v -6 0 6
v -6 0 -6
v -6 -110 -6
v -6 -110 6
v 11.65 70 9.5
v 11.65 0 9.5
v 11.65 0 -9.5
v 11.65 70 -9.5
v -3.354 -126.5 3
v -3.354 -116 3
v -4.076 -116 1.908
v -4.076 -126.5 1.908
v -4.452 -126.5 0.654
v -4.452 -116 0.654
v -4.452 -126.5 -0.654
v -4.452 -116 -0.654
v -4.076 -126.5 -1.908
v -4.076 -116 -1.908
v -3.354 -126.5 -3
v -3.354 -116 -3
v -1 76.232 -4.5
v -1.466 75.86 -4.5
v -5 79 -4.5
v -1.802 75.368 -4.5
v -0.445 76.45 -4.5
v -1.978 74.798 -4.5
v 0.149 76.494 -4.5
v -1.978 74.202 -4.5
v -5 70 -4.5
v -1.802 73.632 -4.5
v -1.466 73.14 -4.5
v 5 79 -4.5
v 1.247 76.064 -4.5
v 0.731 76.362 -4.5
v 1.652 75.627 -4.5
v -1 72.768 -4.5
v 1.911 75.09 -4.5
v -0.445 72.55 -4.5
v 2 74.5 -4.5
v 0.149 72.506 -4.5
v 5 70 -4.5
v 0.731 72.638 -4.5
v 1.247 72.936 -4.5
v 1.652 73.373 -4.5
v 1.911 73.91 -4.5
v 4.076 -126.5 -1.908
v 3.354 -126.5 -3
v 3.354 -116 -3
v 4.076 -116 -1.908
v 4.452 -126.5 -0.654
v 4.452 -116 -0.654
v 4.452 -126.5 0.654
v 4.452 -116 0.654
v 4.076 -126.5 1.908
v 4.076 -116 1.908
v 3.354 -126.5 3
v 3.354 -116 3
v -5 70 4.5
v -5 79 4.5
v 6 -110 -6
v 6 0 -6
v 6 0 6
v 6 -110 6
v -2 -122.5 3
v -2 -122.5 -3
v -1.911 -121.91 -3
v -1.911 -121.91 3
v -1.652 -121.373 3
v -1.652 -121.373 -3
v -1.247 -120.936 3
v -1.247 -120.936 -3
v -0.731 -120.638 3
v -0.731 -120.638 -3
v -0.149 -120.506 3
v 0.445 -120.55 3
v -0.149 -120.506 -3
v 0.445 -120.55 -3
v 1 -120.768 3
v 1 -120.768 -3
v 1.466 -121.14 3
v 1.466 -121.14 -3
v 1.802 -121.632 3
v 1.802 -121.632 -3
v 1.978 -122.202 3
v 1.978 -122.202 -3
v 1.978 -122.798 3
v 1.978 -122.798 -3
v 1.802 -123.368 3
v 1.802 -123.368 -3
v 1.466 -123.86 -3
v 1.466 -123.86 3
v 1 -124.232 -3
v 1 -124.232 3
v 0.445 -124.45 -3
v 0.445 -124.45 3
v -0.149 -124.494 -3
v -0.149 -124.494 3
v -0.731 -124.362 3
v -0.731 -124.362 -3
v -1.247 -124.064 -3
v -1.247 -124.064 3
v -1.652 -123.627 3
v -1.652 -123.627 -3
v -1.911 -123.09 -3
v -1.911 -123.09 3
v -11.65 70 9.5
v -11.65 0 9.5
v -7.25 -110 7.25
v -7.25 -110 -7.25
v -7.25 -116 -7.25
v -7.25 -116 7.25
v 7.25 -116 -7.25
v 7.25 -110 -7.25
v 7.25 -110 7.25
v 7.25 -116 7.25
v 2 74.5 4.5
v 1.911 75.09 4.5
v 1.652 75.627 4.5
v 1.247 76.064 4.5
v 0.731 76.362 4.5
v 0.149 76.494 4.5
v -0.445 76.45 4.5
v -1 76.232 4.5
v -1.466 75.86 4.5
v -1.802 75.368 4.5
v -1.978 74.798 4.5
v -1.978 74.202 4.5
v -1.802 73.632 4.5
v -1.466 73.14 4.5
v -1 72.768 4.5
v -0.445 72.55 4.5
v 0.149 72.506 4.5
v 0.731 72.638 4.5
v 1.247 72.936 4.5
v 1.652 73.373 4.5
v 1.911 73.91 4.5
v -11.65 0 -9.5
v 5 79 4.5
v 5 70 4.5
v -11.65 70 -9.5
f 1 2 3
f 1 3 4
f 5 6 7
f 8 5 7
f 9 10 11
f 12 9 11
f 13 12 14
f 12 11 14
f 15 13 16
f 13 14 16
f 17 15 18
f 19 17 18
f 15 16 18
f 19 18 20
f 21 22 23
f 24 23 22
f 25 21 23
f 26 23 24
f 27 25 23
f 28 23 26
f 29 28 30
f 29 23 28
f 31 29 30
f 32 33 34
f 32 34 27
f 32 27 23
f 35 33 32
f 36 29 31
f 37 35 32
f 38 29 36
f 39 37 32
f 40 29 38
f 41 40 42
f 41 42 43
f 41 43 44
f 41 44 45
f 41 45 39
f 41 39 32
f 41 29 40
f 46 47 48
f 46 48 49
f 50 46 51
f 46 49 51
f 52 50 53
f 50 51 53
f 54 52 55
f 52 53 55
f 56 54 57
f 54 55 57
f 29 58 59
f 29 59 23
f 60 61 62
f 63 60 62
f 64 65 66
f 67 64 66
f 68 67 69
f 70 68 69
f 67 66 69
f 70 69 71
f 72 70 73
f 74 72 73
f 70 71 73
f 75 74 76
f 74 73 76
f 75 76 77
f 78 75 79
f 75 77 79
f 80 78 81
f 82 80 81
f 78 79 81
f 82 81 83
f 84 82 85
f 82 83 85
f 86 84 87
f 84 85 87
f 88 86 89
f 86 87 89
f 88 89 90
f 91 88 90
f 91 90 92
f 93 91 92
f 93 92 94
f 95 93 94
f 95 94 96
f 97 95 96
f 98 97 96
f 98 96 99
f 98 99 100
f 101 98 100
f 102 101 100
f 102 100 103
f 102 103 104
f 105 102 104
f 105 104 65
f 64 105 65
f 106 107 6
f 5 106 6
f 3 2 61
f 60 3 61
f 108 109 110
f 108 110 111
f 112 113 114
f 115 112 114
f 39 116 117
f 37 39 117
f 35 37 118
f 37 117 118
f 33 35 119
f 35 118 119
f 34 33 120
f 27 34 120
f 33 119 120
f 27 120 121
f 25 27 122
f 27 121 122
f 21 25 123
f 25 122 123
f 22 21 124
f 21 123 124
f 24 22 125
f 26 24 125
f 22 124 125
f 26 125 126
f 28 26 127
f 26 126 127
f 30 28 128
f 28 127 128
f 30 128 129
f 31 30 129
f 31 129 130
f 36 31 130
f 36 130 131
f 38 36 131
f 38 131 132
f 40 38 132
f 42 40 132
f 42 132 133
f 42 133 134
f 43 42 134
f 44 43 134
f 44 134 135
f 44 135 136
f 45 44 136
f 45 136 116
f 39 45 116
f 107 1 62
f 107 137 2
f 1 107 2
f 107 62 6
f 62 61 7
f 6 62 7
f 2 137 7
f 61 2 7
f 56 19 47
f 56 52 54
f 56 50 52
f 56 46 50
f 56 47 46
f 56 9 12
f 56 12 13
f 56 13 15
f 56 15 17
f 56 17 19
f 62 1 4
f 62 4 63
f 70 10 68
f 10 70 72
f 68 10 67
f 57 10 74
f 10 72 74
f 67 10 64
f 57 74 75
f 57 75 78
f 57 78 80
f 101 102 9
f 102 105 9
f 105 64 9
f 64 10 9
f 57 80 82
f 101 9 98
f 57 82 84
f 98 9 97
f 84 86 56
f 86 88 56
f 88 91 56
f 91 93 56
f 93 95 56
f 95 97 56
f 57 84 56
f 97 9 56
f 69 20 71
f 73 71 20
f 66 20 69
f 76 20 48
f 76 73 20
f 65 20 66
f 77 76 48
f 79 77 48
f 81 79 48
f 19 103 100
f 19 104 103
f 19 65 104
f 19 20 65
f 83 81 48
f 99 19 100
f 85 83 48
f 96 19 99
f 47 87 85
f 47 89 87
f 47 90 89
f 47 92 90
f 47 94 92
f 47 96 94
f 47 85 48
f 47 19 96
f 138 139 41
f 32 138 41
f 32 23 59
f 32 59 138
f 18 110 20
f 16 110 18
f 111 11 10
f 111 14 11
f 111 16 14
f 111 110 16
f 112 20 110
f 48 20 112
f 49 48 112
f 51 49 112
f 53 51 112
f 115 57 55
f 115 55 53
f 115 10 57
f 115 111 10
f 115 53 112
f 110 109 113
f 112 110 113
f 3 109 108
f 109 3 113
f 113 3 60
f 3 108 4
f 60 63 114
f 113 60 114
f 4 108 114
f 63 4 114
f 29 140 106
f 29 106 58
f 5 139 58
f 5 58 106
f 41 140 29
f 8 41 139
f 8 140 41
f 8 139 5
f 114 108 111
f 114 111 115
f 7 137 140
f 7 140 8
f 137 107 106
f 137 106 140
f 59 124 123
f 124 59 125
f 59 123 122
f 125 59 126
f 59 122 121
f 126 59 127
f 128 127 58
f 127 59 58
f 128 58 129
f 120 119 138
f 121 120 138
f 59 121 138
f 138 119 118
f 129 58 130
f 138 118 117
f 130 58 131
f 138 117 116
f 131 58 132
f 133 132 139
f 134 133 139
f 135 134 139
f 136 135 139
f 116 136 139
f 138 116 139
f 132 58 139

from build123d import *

# Parameters (mm, degrees)
SKETCH_1_W               = 23.3
SKETCH_1_H               = 19
EXTRUDE_1_DEPTH          = 70
SKETCH_2_W               = 10
SKETCH_2_H               = 9
EXTRUDE_2_DEPTH          = 9
SKETCH_3_R               = 2
CUT_EXTRUDE_1_DEPTH      = 6
CUT_EXTRUDE_1_DEPTH_BACK = 15
SKETCH_4_W               = 12
SKETCH_4_H               = 12
EXTRUDE_3_DEPTH          = 110
SKETCH_5_W               = 14.5
SKETCH_5_H               = 14.5
EXTRUDE_4_DEPTH          = 6
SKETCH_6_R               = 4.5
EXTRUDE_5_DEPTH          = 10.5
CUT_EXTRUDE_3_DEPTH      = 10.5
SKETCH_8_R               = 2
CUT_EXTRUDE_4_DEPTH      = 13.5


with BuildPart() as part:
    # 草图1 → 凸台-拉伸1 (new body)
    with BuildSketch(Plane(origin=(0, 0, 0), x_dir=(1, 0, 0), z_dir=(0, 1, 0))):
        Rectangle(SKETCH_1_W, SKETCH_1_H)
    extrude(amount=EXTRUDE_1_DEPTH)

    # 草图2 → 凸台-拉伸2 (add)
    with BuildSketch(Plane(origin=(0, 70, 0), x_dir=(1, 0, 0), z_dir=(0, 1, 0))):
        Rectangle(SKETCH_2_W, SKETCH_2_H)
    extrude(amount=EXTRUDE_2_DEPTH)

    # 草图3 → 切除-拉伸1 (cut, two sides)
    with BuildSketch(Plane.XY.offset(4.5)) as cut_extrude_1_sk:
        with Locations((0, 74.5)):
            Circle(SKETCH_3_R)
    extrude(amount=CUT_EXTRUDE_1_DEPTH, mode=Mode.SUBTRACT)
    extrude(cut_extrude_1_sk.sketch, amount=-CUT_EXTRUDE_1_DEPTH_BACK, mode=Mode.SUBTRACT)

    # 草图4 → 凸台-拉伸3 (add)
    with BuildSketch(Plane.XZ):
        Rectangle(SKETCH_4_W, SKETCH_4_H)
    extrude(amount=EXTRUDE_3_DEPTH)

    # 草图5 → 凸台-拉伸4 (add)
    with BuildSketch(Plane.XZ.offset(110)):
        Rectangle(SKETCH_5_W, SKETCH_5_H)
    extrude(amount=EXTRUDE_4_DEPTH)

    # 草图6 → 凸台-拉伸5 (add)
    with BuildSketch(Plane.XZ.offset(116)):
        Circle(SKETCH_6_R)
    extrude(amount=EXTRUDE_5_DEPTH)

    # 草图7 → 切除-拉伸3 (cut)
    with BuildSketch(Plane.XZ.offset(126.5)):
        with BuildLine():
            Line((-3.354101966, -3), (3.354101966, -3))
            ThreePointArc((3.354101966, -3), (0, -4.5), (-3.354101966, -3))
        make_face()
        with BuildLine():
            Line((-3.354101966, 3), (3.354101966, 3))
            ThreePointArc((3.354101966, 3), (0, 4.5), (-3.354101966, 3))
        make_face()
    extrude(amount=-CUT_EXTRUDE_3_DEPTH, mode=Mode.SUBTRACT)

    # 草图8 → 切除-拉伸4 (cut, through all)
    with BuildSketch(Plane(origin=(0, 0, -3), x_dir=(-1, 0, 0), z_dir=(0, 0, -1))):
        with Locations((0, -122.5)):
            Circle(SKETCH_8_R)
    extrude(amount=-CUT_EXTRUDE_4_DEPTH, mode=Mode.SUBTRACT)


solid = part.part
